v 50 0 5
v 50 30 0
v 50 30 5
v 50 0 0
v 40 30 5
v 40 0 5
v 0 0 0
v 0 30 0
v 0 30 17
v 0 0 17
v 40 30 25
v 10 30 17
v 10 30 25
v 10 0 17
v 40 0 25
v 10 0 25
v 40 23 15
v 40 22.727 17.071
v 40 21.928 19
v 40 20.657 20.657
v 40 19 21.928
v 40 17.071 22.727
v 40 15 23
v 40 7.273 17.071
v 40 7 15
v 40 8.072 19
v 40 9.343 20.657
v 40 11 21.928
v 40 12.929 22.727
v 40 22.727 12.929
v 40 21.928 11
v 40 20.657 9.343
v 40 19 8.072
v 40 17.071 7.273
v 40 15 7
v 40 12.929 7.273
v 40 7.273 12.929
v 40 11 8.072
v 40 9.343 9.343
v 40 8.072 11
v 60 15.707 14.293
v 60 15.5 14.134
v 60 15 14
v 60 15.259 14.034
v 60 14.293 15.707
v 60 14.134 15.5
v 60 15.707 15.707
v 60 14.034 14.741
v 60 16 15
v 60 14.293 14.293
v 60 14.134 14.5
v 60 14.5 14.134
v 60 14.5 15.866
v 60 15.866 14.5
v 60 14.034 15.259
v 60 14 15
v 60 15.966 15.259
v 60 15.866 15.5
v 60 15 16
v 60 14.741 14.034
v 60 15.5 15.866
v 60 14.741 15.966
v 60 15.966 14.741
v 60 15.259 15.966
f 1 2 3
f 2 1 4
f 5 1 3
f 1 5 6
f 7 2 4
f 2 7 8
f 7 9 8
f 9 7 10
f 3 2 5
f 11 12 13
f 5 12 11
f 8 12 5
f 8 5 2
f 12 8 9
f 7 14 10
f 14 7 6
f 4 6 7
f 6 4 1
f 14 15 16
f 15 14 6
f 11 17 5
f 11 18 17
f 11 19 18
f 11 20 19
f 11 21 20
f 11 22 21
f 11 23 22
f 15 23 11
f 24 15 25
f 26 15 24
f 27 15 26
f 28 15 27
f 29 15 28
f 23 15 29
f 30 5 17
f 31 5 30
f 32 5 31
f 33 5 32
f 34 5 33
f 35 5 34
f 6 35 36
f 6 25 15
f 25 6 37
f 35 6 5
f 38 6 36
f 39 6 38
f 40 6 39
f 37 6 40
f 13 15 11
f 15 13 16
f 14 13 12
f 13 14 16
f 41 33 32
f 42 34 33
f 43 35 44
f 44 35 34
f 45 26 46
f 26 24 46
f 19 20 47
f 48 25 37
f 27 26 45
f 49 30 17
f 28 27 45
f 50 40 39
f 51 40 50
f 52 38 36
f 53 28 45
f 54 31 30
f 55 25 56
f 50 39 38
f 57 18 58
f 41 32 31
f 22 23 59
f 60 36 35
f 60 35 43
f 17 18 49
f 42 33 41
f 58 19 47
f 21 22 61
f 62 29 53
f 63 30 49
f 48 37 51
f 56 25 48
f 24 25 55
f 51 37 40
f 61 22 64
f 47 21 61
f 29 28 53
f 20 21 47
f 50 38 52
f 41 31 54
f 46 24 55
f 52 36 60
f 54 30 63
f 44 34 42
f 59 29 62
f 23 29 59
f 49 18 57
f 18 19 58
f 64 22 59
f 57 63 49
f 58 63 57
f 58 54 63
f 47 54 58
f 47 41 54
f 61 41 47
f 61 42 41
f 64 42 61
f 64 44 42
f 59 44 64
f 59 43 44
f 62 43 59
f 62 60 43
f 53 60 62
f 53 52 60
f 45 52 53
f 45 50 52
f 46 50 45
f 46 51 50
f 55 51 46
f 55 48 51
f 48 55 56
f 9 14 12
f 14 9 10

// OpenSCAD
$fn = 24;

module anvil() {
    difference() {
        union() {
            // Base plate
            cube([50, 30, 5]);
            
            // Central body block
            translate([10, 0, 5])
                cube([30, 30, 20]);
            
            // Tapered horn (simplified via cylinder)
            translate([40, 15, 15])
                rotate([0, 90, 0])
                cylinder(h=20, r1=8, r2=1);
            
            // Heel block
            translate([0, 0, 5])
                cube([10, 30, 12]);
        }

        // Embossed Text
        translate([12, -0.1, 15])
            rotate([90, 0, 0])
            linear_extrude(height = 1)
                text("PYCON 2026", size = 5, halign = "left");
    }
}

anvil();
